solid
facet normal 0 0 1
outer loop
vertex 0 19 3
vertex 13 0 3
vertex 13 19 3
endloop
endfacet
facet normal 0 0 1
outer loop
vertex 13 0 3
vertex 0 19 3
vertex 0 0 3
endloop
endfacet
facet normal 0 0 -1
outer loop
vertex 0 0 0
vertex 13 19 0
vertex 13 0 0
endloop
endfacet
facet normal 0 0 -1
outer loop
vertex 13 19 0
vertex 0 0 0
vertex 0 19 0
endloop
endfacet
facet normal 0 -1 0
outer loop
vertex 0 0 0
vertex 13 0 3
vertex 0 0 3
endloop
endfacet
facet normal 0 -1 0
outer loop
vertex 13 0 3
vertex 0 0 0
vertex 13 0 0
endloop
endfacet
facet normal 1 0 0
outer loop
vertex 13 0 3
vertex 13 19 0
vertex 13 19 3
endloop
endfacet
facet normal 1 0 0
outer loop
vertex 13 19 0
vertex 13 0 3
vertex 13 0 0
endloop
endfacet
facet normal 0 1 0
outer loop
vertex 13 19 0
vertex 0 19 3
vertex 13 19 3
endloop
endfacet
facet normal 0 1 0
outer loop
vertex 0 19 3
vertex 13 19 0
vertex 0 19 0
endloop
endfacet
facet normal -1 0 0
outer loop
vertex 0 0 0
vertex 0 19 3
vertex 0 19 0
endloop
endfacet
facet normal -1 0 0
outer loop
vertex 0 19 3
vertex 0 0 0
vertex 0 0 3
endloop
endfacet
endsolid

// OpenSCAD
// Generated by SolidPython 1.0.1 on 2020-07-29 00:46:55


cube(size = [13, 19, 3]);
/***********************************************
*********      SolidPython code:      **********
************************************************
 
# import packages: SolidPython
from solid import *
from solid.utils import *
from itertools import chain, combinations, permutations


class Resize:

    def __init__(self, scad_file):
        self.scad_file = scad_file
        #self.scad_file = import_scad(scad_file)
        # cone/cylinder param:
        self.r1 = 0
        self.r2 = 0
        self.h = 0
        # rectangular prism param:
        self.w = 0
        self.l = 0
        # ellipse param:
        self.r = 0

    # import OpenScad code (file name corresponds to shape)


    # classify shape + parameters
    def assign(self, param1, param2, param3):
        if self.scad_file == 'cone.scad':
            self.r1 = param1
            self.r2 = param2
            self.h = param3
        elif self.scad_file == 'cylinder.scad':
            self.r1 = param1
            self.r2 = param2
            self.h = param3
        elif self.scad_file == 'rectangularPrism.scad':
            self.h = param1
            self.l = param2
            self.w = param3
        else:
            self.r = param1
            self.h = param2

    # resize parameters
    def iterate(self):
        x = range(3, 20, 2)
        i = 1
        if self.scad_file == 'cone.scad':
            tempList = list(permutations(x, 2))
            for temp in tempList:
                param1 = temp[0]
                param2 = temp[1]
                filepath = 'produced_scad_files/' + 'cone' + str(param1) + '_' + str(param2) + '_' + '.scad'
                scad_render_to_file(cylinder(h=param1, r1=param2, r2=0), filepath)

        elif self.scad_file == 'cylinder.scad':
            tempList = list(permutations(x, 3))
            for temp in tempList:
                param1 = temp[0]
                param2 = temp[1]
                filepath = 'produced_scad_files/' + 'cylinder' + str(param1) + '_' + str(param2) + '_' + '.scad'
                scad_render_to_file(cylinder(h=param1, r1=param2, r2=param2), filepath)

        elif self.scad_file == 'rectangularPrism.scad':
            tempList = list(permutations(x, 3))
            for temp in tempList:
                param1 = temp[0]
                param2 = temp[1]
                param3 = temp[2]
                filepath = 'produced_scad_files/' + 'rectangularPrism' + str(param1) + '_' + str(param2) + '_' + str(
                    param3) + '.scad'
                scad_render_to_file(cube(size=(param1, param2, param3)), filepath)

        elif self.scad_file == 'ellipse.scad':
            tempList = list(permutations(x, 4))
            for temp in tempList:
                param1 = temp[0]
                param2 = temp[1]
                param3 = temp[2]
                param4 = temp[3]
                filepath = 'produced_scad_files/' + 'ellipse' + str(param1) + '_' + str(param2) + '_' + str(param3) + '_' + str(param4) + '.scad'
                scad_render_to_file(scale([param1, param2, param3])(sphere(r=param4)), filepath)

    def render_to_scadfile(self):
        scad_render_to_file(scad, 'example.scad') 
 
************************************************/
